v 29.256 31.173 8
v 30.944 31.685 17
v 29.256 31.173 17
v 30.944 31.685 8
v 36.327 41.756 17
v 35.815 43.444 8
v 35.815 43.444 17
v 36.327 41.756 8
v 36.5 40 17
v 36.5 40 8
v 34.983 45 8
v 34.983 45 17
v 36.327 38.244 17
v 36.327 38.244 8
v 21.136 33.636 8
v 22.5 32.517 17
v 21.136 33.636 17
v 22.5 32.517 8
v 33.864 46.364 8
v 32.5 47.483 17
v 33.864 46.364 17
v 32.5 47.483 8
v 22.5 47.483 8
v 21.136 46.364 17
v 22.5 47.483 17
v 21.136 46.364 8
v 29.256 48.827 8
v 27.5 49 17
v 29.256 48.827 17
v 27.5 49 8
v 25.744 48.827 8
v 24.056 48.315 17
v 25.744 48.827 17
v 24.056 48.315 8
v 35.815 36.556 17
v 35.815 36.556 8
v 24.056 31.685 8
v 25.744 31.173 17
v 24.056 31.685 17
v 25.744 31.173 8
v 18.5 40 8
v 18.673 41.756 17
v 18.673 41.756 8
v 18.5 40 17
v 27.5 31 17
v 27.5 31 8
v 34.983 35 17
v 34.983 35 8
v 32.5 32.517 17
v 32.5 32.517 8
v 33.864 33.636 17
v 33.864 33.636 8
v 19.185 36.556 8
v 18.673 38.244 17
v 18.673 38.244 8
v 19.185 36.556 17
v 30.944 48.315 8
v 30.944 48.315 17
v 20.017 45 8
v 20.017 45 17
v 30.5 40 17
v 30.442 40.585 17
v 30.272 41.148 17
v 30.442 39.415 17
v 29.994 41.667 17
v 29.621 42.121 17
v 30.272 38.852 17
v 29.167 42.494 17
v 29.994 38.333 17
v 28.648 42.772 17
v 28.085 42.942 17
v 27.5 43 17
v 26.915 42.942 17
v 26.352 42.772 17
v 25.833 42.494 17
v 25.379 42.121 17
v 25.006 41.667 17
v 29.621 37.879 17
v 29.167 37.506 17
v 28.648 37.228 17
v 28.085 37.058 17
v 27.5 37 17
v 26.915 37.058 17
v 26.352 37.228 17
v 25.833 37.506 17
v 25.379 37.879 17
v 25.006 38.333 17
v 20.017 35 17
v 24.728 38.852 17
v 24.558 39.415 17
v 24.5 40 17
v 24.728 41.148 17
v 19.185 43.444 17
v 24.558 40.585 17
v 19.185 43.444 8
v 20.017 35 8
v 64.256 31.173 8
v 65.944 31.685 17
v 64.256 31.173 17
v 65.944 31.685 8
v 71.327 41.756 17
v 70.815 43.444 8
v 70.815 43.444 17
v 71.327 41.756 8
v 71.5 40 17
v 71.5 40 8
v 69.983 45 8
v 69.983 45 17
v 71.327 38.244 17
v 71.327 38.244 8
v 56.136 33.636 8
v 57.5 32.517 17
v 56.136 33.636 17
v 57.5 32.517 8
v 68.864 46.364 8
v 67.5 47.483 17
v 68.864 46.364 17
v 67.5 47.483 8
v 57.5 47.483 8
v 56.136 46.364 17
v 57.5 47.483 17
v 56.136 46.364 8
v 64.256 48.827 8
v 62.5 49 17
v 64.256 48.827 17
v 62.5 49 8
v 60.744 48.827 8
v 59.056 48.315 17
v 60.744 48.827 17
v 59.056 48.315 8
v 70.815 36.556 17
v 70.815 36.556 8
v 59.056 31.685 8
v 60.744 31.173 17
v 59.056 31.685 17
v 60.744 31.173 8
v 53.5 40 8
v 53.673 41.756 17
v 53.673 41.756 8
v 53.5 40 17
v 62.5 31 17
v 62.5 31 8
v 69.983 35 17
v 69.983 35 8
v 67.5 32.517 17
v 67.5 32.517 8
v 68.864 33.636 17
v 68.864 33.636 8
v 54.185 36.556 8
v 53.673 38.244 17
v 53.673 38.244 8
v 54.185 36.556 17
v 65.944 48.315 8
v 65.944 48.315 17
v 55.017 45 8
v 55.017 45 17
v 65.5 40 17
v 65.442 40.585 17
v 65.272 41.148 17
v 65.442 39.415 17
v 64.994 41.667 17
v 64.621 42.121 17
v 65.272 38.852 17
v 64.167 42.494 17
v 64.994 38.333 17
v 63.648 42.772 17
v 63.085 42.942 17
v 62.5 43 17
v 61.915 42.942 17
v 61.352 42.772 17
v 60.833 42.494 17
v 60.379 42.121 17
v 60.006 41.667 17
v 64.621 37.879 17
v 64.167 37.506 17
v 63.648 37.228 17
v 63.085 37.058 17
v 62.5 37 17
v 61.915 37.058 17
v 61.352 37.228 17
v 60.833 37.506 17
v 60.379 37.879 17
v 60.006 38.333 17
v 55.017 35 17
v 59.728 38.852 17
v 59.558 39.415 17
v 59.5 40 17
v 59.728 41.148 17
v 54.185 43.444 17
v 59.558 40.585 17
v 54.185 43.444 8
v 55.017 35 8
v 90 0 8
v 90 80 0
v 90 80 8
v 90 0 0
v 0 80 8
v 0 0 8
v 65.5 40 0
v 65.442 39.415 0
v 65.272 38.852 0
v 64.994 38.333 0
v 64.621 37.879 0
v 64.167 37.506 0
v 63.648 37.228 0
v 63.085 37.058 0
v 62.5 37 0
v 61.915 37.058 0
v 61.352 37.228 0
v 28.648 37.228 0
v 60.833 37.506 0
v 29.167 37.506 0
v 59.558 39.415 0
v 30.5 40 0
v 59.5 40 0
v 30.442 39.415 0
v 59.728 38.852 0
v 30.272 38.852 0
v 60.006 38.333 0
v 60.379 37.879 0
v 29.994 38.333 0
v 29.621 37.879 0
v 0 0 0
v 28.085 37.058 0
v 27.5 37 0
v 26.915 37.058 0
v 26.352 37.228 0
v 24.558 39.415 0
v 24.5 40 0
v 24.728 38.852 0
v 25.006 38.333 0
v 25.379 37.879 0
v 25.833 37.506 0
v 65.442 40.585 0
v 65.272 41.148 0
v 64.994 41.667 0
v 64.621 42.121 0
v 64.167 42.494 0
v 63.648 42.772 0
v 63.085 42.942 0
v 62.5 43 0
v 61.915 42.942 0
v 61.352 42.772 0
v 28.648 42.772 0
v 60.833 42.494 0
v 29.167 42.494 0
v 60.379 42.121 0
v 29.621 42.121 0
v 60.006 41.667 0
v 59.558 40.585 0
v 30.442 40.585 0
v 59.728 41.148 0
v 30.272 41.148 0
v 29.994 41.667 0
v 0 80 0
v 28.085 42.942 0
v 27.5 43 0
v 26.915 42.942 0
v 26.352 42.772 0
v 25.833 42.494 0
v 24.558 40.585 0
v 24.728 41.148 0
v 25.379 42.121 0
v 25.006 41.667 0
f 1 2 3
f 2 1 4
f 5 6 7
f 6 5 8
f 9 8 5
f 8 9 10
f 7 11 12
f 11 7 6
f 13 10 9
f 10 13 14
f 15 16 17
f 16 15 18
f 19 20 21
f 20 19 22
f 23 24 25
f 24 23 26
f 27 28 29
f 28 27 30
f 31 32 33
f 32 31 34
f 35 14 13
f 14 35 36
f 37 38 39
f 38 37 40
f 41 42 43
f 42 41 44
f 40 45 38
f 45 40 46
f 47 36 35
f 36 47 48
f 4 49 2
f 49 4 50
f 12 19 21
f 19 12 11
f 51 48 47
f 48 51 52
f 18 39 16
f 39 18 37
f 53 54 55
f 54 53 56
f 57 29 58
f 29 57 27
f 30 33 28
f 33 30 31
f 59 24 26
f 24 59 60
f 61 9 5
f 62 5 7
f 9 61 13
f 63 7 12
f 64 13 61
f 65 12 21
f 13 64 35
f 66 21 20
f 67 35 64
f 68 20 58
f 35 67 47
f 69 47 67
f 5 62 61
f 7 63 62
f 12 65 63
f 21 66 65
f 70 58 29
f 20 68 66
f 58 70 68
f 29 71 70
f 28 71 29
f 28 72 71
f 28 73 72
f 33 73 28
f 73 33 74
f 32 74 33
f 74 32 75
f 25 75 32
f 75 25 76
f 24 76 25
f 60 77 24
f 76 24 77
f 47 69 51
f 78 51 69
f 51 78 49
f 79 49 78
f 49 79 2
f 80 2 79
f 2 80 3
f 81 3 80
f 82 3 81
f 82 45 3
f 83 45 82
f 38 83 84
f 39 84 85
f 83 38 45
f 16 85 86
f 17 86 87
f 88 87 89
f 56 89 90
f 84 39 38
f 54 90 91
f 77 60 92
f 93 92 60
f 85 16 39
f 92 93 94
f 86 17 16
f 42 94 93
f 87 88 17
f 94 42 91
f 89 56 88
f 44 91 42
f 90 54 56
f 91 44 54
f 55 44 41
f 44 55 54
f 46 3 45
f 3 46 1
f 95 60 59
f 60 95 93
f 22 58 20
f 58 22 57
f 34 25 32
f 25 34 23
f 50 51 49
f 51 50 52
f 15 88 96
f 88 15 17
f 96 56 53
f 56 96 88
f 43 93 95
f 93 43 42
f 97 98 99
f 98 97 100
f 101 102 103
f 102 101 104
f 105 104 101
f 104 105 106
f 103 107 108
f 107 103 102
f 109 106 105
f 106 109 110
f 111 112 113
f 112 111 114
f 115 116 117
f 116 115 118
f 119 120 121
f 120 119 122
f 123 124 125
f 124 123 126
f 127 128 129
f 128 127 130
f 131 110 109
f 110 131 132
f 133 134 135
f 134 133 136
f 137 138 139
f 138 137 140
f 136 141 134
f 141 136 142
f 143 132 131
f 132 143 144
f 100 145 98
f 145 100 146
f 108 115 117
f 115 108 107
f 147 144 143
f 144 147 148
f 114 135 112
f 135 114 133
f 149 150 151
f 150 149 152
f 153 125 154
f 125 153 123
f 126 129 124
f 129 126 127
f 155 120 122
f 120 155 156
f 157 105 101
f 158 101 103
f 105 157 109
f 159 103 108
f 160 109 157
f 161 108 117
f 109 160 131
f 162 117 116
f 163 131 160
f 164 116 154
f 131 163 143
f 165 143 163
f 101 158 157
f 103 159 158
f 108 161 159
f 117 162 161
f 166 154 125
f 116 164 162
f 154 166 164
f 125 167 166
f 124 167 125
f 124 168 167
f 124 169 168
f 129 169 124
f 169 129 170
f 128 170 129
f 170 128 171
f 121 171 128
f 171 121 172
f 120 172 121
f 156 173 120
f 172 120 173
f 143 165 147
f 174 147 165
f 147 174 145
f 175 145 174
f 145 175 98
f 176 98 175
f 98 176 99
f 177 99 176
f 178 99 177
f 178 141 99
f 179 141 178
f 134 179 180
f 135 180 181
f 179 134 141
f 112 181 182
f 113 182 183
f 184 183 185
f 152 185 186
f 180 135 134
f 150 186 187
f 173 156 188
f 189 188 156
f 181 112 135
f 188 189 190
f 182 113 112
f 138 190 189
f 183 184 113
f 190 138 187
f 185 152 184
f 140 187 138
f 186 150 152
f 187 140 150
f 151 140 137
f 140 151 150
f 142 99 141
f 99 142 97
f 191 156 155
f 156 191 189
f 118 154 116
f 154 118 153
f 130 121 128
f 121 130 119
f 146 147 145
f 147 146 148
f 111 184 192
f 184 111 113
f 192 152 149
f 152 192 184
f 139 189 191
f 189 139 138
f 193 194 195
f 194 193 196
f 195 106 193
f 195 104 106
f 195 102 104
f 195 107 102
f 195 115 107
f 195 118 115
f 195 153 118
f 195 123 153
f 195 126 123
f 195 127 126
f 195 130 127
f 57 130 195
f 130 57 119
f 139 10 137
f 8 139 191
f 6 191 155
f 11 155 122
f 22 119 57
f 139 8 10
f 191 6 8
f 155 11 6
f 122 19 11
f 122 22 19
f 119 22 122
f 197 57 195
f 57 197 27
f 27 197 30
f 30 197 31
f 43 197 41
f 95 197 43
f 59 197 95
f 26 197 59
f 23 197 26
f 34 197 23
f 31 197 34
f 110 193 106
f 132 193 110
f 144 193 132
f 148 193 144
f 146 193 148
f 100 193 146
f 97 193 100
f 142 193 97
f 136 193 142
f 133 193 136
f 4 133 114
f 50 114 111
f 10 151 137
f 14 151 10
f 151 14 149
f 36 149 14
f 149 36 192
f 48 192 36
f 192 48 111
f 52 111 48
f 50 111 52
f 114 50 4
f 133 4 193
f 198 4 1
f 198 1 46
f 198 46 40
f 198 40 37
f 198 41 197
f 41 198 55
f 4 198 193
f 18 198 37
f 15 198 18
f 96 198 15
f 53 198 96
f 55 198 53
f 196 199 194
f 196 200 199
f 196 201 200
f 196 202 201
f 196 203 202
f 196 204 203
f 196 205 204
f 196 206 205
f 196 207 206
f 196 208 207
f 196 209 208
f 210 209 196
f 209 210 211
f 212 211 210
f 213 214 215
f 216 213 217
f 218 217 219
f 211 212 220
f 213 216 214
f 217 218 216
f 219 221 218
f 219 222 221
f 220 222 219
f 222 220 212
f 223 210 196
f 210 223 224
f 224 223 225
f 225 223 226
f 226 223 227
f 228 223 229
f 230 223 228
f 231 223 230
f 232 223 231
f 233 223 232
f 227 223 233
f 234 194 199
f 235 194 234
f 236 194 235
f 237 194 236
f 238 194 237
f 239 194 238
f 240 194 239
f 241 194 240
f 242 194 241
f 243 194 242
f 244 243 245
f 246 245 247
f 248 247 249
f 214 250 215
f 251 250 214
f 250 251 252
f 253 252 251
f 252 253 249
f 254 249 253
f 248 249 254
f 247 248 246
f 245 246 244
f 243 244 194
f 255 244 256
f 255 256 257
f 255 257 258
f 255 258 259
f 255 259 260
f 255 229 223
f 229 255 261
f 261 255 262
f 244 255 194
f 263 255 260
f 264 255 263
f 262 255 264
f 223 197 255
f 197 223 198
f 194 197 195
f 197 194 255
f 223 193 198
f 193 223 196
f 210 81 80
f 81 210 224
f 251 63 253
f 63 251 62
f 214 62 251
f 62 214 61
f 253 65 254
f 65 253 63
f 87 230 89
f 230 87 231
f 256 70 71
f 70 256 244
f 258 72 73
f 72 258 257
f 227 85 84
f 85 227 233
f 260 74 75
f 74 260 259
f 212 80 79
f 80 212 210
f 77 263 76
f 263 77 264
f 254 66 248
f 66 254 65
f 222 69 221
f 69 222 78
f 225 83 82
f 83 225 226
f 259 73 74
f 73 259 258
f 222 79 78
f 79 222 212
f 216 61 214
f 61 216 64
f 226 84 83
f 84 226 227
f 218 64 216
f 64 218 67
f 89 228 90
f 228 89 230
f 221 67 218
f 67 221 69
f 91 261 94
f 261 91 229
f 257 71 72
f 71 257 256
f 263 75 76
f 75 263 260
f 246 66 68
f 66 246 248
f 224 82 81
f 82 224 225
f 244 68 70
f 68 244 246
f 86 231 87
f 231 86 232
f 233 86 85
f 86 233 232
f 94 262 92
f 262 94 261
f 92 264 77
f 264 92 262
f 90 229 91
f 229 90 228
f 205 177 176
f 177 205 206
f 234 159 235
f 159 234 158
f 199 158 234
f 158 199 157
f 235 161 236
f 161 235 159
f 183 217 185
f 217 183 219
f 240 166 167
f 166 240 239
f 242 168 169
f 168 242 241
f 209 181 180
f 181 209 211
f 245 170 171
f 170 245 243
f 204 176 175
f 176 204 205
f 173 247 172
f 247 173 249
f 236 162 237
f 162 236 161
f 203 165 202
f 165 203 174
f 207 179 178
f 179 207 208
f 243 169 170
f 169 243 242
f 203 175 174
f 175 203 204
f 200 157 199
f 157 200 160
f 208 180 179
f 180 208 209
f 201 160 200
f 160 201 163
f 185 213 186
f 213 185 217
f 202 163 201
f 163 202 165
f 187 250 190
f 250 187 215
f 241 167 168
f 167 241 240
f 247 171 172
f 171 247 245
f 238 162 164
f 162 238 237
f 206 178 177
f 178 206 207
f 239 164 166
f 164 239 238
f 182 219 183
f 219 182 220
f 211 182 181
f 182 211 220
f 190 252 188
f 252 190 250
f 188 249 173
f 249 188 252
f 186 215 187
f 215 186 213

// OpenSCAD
$fn = 32;

// ----------------------------------------------------------------------
// Drill jig: two_boss jig
// ----------------------------------------------------------------------

// --- parameters (mm) ---
plate_l = 90;             // plate length, X
plate_w = 80;             // plate width, Y
plate_t = 8;              // plate thickness
boss_d = 18;              // guide boss diameter
boss_h = 10;              // boss height above the plate
guide_d = 6;              // guide hole diameter
boss_pitch = 35;          // boss pitch

n_boss = 2;  // guide bosses
boss_x0 = (plate_l - (n_boss - 1) * boss_pitch) / 2;  // first boss X
boss_top = plate_t - 1 + boss_h;  // boss crown height
total_h = boss_top;  // overall height

difference() {
  union() {
  cube([plate_l, plate_w, plate_t]);
  for (i = [0 : n_boss - 1])
    translate([boss_x0 + i * boss_pitch, plate_w / 2, plate_t - 1])
      cylinder(h = boss_h, d = boss_d);
  }
  for (i = [0 : n_boss - 1])
    translate([boss_x0 + i * boss_pitch, plate_w / 2, -1])
      cylinder(h = plate_t + boss_h, d = guide_d);
}
